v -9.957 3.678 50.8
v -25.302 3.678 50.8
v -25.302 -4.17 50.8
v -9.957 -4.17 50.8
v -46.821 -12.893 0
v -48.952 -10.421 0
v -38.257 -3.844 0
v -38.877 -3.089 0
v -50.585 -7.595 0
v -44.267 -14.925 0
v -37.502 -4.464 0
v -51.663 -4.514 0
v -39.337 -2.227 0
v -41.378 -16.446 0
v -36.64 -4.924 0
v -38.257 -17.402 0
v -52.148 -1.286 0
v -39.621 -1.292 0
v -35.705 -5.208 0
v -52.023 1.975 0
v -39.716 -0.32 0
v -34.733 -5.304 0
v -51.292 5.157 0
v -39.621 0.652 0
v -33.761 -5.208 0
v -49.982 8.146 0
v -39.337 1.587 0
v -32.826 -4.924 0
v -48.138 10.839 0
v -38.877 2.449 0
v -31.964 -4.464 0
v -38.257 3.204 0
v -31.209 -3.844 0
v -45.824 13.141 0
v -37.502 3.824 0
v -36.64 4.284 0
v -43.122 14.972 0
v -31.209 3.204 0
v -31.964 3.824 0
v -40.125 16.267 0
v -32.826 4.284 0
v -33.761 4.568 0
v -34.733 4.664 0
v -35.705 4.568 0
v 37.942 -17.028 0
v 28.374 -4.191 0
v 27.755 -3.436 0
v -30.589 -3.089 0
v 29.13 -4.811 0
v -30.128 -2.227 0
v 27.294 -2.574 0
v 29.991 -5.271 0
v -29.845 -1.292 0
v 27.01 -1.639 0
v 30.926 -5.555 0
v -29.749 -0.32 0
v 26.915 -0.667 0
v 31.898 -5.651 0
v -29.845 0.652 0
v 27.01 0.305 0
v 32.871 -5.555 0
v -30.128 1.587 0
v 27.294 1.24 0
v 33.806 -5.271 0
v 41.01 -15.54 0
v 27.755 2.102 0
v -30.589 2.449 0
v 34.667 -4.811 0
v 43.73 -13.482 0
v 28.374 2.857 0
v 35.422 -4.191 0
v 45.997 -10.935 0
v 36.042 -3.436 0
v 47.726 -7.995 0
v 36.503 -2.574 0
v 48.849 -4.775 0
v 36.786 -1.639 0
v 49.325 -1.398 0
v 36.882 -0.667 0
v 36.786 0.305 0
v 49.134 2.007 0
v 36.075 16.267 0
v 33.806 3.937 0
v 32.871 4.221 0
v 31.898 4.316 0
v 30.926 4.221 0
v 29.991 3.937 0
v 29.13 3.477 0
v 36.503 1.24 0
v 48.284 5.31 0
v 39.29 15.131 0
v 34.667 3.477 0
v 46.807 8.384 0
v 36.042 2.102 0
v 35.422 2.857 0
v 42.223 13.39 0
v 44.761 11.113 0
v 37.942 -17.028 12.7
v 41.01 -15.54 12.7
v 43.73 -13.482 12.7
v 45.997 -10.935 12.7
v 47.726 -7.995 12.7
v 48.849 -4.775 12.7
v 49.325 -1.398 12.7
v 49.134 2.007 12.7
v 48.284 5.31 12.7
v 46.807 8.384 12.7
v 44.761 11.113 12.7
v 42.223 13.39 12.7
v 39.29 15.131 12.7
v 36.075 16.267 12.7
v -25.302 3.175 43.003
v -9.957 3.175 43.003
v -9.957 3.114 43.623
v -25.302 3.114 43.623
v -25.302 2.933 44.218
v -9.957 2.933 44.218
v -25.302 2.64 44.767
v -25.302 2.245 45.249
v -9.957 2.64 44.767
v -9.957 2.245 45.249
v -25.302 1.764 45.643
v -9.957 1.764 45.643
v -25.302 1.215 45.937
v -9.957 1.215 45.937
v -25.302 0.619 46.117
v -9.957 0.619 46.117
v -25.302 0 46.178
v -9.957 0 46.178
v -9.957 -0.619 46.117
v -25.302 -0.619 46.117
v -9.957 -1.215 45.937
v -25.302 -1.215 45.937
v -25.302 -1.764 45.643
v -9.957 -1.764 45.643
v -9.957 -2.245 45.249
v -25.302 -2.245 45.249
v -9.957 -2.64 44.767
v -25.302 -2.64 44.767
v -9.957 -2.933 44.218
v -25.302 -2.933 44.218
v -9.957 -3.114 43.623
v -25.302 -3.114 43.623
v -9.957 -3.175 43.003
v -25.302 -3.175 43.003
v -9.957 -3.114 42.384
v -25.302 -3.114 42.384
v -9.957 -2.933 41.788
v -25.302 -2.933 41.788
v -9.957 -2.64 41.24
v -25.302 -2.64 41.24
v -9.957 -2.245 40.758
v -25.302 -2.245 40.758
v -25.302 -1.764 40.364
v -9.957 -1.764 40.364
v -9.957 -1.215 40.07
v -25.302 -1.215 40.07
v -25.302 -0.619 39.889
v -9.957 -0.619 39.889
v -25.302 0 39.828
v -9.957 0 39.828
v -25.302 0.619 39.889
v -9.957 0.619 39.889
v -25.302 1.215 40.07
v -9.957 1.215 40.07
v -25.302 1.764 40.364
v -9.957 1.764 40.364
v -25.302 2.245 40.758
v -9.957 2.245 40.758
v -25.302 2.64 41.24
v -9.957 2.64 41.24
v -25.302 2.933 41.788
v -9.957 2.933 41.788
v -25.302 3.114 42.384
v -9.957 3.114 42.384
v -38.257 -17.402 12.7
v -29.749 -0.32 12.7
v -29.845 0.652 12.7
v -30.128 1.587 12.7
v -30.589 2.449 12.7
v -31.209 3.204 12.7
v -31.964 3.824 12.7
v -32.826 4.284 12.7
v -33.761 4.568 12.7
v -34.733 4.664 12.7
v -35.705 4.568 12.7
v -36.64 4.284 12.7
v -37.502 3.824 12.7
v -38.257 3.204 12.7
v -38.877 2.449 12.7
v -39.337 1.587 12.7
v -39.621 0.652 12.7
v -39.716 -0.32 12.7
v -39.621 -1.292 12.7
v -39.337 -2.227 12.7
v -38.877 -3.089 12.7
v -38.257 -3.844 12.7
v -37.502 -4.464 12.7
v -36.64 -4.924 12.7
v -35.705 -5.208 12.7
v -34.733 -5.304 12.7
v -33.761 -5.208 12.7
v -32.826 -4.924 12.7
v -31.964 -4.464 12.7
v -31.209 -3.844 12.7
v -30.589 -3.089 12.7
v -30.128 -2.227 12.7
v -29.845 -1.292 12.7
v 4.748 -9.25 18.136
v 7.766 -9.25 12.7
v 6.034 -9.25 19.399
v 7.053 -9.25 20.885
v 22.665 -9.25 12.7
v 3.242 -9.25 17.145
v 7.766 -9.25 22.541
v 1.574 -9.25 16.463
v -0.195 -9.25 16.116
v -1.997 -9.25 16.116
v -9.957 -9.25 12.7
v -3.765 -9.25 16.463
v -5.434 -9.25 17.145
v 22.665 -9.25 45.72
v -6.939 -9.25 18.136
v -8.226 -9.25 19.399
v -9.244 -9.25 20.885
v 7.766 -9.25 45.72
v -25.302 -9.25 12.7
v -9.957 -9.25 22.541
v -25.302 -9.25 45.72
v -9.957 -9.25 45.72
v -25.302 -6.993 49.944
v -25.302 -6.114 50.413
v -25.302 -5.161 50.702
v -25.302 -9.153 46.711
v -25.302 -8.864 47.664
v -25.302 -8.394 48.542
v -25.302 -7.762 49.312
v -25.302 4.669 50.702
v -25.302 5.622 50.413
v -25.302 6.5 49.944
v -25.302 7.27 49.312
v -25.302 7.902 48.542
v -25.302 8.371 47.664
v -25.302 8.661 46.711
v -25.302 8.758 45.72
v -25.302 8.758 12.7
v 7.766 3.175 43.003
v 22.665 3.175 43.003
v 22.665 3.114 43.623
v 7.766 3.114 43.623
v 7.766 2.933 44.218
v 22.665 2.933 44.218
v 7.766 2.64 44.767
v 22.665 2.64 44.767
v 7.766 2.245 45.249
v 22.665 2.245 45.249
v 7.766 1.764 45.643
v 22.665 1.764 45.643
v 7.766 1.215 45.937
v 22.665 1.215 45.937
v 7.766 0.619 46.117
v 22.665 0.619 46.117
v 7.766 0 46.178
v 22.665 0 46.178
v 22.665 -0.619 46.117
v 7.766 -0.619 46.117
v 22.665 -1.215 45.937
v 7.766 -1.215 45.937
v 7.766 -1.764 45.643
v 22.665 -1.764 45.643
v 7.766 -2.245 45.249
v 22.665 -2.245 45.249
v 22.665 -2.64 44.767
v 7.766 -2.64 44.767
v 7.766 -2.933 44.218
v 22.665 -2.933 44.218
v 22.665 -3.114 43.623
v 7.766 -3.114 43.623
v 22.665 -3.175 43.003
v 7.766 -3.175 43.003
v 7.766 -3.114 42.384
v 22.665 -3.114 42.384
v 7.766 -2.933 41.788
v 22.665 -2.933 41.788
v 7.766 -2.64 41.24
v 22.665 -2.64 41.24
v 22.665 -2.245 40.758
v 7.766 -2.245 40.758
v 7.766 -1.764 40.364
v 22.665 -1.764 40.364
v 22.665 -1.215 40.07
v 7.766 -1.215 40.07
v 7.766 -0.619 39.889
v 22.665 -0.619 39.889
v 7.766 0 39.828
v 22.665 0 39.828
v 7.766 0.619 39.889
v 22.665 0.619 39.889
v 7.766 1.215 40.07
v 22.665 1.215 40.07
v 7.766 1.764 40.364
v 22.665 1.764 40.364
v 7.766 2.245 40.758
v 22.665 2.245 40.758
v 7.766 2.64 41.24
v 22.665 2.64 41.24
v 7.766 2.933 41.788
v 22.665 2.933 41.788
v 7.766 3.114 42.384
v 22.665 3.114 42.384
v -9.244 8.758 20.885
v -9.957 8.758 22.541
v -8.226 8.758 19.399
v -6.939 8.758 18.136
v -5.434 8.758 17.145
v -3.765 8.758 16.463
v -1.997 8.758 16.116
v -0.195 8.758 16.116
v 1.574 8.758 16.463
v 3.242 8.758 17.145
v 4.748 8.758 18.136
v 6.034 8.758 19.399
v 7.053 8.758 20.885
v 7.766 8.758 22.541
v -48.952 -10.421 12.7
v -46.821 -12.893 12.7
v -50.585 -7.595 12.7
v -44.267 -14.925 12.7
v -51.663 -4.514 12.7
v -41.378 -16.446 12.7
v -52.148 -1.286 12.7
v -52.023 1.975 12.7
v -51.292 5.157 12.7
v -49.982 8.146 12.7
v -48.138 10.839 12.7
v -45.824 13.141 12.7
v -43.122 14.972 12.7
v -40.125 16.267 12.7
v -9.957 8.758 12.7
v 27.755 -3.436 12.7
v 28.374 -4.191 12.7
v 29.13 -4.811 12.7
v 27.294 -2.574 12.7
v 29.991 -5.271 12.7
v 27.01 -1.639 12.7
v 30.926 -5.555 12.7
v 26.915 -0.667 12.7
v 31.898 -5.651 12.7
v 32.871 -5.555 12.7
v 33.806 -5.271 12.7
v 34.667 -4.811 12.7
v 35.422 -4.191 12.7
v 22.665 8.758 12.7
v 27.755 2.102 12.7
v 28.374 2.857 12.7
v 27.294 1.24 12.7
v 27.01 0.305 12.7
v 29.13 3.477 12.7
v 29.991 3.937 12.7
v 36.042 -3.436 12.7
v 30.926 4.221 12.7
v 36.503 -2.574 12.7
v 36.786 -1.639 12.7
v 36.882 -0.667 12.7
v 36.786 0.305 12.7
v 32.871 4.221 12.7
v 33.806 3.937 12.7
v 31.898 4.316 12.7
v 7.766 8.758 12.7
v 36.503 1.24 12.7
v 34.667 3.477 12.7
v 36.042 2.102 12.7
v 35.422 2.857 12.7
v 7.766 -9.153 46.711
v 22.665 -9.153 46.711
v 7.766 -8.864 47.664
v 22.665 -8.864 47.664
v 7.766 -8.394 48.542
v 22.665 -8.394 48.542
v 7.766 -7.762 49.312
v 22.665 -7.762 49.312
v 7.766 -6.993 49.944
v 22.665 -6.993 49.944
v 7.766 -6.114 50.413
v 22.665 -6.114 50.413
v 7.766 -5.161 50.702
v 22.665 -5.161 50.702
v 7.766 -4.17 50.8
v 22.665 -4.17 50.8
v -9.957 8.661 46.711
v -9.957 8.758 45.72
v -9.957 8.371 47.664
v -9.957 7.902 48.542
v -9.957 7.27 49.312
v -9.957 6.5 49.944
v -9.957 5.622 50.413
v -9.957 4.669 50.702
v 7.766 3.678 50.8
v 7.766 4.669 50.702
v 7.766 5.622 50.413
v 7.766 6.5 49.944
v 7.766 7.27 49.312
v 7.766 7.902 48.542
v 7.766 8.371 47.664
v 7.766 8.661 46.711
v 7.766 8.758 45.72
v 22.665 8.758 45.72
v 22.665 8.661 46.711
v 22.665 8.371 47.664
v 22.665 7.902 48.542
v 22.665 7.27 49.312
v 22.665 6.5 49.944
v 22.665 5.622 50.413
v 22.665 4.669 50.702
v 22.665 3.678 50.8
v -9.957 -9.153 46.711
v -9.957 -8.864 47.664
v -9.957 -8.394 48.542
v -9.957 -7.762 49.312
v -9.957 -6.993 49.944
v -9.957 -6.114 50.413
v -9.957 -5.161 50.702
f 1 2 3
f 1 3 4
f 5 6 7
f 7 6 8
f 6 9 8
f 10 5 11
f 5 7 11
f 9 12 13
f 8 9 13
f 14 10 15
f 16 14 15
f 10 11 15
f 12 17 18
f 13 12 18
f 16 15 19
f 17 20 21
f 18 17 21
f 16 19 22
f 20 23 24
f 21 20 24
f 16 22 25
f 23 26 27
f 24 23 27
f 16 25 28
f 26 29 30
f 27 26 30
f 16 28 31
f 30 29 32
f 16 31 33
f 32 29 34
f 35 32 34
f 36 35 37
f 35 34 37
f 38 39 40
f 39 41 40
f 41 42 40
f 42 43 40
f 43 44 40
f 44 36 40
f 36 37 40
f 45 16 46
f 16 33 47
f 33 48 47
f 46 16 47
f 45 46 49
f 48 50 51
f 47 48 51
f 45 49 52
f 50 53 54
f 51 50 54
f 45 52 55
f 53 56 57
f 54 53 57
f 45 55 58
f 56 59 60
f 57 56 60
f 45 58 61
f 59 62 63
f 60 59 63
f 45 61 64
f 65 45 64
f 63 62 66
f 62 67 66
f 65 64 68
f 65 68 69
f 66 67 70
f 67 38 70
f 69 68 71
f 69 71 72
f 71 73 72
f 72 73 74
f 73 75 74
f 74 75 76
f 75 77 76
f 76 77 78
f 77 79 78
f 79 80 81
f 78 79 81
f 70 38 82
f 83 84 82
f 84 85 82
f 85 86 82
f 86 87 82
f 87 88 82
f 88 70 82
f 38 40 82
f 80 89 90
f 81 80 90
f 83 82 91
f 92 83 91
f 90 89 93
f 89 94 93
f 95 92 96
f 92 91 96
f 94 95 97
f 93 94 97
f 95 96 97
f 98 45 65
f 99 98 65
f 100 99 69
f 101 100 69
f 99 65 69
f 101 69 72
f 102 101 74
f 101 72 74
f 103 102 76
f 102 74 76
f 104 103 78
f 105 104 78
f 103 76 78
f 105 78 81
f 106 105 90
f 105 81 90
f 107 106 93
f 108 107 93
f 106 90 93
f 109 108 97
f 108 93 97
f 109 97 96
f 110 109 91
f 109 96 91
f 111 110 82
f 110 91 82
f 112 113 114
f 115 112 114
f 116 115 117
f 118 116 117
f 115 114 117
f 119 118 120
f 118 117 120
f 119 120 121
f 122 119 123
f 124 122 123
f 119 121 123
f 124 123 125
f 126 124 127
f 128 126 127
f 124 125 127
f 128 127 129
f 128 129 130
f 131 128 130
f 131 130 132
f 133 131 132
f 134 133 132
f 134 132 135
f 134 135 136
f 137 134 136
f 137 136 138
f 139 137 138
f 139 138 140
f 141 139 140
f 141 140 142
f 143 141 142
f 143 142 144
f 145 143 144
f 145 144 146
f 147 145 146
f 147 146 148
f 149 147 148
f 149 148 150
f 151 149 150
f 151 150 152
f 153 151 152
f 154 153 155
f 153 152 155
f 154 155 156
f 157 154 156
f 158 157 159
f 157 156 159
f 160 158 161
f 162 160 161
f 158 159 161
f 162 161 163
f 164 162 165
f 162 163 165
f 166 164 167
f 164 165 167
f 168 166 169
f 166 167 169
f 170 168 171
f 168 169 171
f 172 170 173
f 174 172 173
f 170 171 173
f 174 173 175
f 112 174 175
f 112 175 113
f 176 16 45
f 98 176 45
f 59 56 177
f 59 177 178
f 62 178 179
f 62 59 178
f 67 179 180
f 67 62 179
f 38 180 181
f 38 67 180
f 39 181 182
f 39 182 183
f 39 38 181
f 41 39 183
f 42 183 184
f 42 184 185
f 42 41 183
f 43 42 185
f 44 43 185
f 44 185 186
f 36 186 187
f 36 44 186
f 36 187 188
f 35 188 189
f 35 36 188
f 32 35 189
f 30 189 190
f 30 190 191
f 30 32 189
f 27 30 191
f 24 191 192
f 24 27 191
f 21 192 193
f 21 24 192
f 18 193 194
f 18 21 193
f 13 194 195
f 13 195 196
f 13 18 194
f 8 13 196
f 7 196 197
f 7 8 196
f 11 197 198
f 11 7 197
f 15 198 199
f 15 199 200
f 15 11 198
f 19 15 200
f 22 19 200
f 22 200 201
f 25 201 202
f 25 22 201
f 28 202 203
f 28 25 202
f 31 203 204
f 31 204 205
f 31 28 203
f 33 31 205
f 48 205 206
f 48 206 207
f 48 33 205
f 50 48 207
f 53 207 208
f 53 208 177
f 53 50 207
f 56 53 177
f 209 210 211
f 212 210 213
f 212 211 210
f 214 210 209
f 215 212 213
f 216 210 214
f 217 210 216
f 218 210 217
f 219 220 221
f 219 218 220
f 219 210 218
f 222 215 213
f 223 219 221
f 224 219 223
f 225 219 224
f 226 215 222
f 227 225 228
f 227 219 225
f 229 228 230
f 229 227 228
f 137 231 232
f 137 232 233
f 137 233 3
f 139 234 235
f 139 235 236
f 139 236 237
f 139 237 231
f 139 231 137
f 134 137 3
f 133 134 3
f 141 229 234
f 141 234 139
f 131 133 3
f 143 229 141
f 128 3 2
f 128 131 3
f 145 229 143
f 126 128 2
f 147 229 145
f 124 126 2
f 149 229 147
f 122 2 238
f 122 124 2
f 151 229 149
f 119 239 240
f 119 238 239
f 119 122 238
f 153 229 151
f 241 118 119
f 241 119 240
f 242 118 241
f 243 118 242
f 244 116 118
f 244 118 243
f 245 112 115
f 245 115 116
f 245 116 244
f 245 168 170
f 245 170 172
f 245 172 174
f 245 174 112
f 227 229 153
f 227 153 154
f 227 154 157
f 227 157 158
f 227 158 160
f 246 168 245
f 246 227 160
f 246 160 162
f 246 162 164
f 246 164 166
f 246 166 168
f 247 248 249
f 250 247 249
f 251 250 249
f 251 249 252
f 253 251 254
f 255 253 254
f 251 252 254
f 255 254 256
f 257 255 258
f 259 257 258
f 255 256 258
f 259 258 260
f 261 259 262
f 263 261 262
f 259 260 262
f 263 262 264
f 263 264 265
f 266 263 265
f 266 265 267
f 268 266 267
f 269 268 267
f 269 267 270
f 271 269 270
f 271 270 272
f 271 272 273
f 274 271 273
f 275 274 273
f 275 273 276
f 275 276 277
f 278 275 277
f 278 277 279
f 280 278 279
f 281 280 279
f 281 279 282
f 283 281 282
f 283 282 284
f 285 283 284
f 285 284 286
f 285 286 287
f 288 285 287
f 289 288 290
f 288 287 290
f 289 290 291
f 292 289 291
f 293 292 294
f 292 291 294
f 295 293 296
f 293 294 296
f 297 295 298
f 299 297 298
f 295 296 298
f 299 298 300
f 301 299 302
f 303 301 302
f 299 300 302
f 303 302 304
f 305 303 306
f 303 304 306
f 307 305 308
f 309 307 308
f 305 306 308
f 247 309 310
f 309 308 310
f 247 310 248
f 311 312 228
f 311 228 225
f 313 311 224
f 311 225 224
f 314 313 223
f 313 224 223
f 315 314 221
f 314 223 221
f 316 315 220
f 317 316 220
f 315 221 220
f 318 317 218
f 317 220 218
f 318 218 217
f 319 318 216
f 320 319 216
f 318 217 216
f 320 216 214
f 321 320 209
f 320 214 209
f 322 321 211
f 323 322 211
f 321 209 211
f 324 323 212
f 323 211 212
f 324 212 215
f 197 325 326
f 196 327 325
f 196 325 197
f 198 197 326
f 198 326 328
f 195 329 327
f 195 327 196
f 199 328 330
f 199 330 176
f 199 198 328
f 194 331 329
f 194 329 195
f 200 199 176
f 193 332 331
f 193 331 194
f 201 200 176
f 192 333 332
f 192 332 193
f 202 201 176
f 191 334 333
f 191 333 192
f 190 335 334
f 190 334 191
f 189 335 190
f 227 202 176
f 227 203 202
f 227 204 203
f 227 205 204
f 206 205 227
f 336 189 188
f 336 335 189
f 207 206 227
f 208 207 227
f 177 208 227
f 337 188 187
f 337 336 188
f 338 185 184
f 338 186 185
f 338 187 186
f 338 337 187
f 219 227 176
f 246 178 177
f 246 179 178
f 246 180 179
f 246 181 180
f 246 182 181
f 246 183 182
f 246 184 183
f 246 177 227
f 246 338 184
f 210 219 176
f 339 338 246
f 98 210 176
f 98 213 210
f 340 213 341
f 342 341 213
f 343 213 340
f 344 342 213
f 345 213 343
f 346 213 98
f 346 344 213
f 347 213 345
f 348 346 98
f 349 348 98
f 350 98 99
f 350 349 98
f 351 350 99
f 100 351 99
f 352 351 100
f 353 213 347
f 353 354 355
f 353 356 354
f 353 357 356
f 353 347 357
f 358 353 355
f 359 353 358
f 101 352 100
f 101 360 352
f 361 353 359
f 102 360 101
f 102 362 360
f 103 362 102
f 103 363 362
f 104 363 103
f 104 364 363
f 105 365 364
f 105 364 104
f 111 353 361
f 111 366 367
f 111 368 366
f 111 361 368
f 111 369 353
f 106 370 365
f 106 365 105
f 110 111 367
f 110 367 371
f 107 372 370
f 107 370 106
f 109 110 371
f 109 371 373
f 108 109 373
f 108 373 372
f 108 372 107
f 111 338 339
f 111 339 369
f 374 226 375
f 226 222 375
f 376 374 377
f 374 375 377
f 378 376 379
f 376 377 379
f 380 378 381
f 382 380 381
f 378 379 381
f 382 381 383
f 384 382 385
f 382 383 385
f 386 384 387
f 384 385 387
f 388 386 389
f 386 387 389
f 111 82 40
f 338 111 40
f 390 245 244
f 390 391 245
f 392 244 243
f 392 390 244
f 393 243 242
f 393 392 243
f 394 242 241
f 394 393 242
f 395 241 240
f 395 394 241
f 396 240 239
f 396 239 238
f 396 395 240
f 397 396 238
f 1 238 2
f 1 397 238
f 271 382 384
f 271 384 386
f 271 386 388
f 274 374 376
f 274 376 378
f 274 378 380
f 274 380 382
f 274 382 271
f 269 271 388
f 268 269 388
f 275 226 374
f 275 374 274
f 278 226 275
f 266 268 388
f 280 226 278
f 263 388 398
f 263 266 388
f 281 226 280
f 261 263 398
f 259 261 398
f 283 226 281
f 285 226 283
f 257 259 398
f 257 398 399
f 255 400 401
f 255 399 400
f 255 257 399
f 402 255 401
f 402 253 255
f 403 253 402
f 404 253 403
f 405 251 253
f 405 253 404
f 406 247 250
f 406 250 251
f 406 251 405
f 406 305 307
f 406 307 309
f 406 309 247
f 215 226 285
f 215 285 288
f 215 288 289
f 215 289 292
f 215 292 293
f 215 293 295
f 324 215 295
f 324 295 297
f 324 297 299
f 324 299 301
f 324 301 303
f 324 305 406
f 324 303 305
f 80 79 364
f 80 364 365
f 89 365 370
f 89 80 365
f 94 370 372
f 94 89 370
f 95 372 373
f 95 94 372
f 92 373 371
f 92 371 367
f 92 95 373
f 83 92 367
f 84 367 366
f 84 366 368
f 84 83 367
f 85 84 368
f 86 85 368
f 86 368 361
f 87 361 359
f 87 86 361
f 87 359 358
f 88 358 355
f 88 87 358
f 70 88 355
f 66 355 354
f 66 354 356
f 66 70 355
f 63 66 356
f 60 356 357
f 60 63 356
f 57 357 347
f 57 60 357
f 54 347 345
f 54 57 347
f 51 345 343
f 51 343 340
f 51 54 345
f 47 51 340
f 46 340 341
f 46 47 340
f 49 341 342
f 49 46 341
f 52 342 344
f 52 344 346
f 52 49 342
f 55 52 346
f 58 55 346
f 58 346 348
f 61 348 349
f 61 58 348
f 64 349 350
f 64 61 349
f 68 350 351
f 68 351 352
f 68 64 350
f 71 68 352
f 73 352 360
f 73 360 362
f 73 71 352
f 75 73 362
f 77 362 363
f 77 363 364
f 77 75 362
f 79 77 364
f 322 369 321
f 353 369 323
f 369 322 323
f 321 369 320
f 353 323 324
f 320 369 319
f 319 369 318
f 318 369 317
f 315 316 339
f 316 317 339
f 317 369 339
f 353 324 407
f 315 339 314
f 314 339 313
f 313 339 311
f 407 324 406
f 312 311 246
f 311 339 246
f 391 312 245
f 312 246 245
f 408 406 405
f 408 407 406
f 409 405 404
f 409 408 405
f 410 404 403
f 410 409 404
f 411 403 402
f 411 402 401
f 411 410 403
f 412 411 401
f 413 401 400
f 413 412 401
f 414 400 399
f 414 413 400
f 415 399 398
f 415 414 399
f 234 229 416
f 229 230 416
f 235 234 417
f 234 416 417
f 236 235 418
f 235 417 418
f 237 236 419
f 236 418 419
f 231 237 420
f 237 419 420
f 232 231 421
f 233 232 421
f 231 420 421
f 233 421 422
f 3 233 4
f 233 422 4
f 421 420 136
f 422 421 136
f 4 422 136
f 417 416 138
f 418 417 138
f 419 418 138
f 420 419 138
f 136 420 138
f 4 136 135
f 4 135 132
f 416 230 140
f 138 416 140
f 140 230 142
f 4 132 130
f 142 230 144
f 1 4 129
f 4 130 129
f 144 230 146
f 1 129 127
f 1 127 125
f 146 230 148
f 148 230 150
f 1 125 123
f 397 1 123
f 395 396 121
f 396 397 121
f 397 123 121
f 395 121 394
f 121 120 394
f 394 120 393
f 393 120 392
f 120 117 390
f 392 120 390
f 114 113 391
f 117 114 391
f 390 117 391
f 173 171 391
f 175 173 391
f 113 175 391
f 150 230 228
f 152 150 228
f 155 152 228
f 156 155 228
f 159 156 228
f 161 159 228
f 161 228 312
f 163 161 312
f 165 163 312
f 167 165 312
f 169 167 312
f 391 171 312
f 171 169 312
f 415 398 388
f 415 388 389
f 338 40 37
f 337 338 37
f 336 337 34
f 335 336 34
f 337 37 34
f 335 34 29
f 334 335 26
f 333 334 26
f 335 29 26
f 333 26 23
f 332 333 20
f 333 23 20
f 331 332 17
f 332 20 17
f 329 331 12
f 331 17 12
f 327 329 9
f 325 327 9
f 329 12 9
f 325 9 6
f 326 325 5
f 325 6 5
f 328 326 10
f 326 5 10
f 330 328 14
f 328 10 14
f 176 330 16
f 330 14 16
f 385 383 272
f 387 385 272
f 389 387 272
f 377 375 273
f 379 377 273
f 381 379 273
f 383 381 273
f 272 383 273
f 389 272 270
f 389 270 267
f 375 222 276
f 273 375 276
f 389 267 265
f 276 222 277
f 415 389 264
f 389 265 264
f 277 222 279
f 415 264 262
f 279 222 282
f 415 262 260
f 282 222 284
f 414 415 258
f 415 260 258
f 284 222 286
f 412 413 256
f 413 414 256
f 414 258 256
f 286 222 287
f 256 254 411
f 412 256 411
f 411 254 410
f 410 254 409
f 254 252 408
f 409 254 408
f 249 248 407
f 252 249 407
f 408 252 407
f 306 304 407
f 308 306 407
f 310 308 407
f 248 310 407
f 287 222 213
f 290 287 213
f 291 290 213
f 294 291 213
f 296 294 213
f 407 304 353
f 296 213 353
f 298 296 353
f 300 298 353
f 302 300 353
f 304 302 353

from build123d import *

# Parameters (mm, degrees)
F0_R     = 4.9836691613
F0_W     = 15.3446597978
F0_H     = 18.0084193125
F0_W_2   = 14.8993115872
F1_DEPTH = 12.7
F2_DEPTH = 50.8
F3_R     = 5.08
F6_D     = 6.35
F5_W     = 18.0084193125
F5_H     = 9.8407220423
F7_DEPTH = 17.78
F9_DEPTH = 25.4


with BuildPart() as f1:
    # F0 (on Top) → F1 (new body)
    with BuildSketch(Plane.XY):
        with BuildLine():
            Line((36.0745033145, 16.2670928985), (-40.1254966855, 16.2670928985))
            ThreePointArc((-40.1254966855, 16.2670928985), (-52.1476034559, -1.2861349798), (-38.2574259843, -17.4016501734))
            Line((-38.2574259843, -17.4016501734), (37.9416596259, -17.0283511457))
            ThreePointArc((37.9416596259, -17.0283511457), (49.3126119569, 0.3093896587), (36.0745033145, 16.2670928985))
        make_face()
        with Locations((31.8983709386, -0.6671736808)):
            Circle(F0_R, mode=Mode.SUBTRACT)
        with Locations((-34.7327866279, -0.3198943033)):
            Circle(F0_R, mode=Mode.SUBTRACT)
        with Locations((-17.6295996644, -0.2460409887)):
            Rectangle(F0_W, F0_H, mode=Mode.SUBTRACT)
        with Locations((15.2155896649, -0.2460409887)):
            Rectangle(F0_W_2, F0_H, mode=Mode.SUBTRACT)
        with Locations((-17.6295996644, -0.2460409887)):
            Rectangle(F0_W, F0_H)
        with Locations((15.2155896649, -0.2460409887)):
            Rectangle(F0_W_2, F0_H)
    extrude(amount=F1_DEPTH)

    # F0 (on Top) → F2 (join)
    with BuildSketch(Plane.XY):
        with Locations((-17.6295996644, -0.2460409887)):
            Rectangle(F0_W, F0_H)
        with Locations((15.2155896649, -0.2460409887)):
            Rectangle(F0_W_2, F0_H)
    extrude(amount=F2_DEPTH)

    # F3
    f3_edges = [f1.edges().sort_by_distance(p)[0] for p in [
        (-17.6296, -9.250251, 50.8),
        (-17.6296, 8.758169, 50.8),
        (15.21559, 8.758169, 50.8),
        (15.21559, -9.250251, 50.8),
    ]]
    fillet(f3_edges, radius=F3_R)

    # F6 (through all)
    with Locations(Plane(origin=(-25.3019295633, 0, 0), x_dir=(0, -1, 0), z_dir=(-1, 0, 0))):
        with Locations((0, 43.0034697056)):
            Hole(F6_D / 2)

    # F5 (on face) → F7 (join)
    with BuildSketch(Plane.YZ.offset(-9.9572697654)):
        with Locations((-0.2460409887, 17.6203610212)):
            Rectangle(F5_W, F5_H)
    extrude(amount=F7_DEPTH)

    # F8 (on face) → F9 (cut)
    with BuildSketch(Plane.XZ.offset(9.250250645)):
        with BuildLine():
            Line((7.7659338713, 22.5407220423), (-9.9572697654, 22.5407220423))
            ThreePointArc((-9.9572697654, 22.5407220423), (-1.0956679471, 16.072257104), (7.7659338713, 22.5407220423))
        make_face()
    extrude(amount=-F9_DEPTH, mode=Mode.SUBTRACT)


solid = f1.part
